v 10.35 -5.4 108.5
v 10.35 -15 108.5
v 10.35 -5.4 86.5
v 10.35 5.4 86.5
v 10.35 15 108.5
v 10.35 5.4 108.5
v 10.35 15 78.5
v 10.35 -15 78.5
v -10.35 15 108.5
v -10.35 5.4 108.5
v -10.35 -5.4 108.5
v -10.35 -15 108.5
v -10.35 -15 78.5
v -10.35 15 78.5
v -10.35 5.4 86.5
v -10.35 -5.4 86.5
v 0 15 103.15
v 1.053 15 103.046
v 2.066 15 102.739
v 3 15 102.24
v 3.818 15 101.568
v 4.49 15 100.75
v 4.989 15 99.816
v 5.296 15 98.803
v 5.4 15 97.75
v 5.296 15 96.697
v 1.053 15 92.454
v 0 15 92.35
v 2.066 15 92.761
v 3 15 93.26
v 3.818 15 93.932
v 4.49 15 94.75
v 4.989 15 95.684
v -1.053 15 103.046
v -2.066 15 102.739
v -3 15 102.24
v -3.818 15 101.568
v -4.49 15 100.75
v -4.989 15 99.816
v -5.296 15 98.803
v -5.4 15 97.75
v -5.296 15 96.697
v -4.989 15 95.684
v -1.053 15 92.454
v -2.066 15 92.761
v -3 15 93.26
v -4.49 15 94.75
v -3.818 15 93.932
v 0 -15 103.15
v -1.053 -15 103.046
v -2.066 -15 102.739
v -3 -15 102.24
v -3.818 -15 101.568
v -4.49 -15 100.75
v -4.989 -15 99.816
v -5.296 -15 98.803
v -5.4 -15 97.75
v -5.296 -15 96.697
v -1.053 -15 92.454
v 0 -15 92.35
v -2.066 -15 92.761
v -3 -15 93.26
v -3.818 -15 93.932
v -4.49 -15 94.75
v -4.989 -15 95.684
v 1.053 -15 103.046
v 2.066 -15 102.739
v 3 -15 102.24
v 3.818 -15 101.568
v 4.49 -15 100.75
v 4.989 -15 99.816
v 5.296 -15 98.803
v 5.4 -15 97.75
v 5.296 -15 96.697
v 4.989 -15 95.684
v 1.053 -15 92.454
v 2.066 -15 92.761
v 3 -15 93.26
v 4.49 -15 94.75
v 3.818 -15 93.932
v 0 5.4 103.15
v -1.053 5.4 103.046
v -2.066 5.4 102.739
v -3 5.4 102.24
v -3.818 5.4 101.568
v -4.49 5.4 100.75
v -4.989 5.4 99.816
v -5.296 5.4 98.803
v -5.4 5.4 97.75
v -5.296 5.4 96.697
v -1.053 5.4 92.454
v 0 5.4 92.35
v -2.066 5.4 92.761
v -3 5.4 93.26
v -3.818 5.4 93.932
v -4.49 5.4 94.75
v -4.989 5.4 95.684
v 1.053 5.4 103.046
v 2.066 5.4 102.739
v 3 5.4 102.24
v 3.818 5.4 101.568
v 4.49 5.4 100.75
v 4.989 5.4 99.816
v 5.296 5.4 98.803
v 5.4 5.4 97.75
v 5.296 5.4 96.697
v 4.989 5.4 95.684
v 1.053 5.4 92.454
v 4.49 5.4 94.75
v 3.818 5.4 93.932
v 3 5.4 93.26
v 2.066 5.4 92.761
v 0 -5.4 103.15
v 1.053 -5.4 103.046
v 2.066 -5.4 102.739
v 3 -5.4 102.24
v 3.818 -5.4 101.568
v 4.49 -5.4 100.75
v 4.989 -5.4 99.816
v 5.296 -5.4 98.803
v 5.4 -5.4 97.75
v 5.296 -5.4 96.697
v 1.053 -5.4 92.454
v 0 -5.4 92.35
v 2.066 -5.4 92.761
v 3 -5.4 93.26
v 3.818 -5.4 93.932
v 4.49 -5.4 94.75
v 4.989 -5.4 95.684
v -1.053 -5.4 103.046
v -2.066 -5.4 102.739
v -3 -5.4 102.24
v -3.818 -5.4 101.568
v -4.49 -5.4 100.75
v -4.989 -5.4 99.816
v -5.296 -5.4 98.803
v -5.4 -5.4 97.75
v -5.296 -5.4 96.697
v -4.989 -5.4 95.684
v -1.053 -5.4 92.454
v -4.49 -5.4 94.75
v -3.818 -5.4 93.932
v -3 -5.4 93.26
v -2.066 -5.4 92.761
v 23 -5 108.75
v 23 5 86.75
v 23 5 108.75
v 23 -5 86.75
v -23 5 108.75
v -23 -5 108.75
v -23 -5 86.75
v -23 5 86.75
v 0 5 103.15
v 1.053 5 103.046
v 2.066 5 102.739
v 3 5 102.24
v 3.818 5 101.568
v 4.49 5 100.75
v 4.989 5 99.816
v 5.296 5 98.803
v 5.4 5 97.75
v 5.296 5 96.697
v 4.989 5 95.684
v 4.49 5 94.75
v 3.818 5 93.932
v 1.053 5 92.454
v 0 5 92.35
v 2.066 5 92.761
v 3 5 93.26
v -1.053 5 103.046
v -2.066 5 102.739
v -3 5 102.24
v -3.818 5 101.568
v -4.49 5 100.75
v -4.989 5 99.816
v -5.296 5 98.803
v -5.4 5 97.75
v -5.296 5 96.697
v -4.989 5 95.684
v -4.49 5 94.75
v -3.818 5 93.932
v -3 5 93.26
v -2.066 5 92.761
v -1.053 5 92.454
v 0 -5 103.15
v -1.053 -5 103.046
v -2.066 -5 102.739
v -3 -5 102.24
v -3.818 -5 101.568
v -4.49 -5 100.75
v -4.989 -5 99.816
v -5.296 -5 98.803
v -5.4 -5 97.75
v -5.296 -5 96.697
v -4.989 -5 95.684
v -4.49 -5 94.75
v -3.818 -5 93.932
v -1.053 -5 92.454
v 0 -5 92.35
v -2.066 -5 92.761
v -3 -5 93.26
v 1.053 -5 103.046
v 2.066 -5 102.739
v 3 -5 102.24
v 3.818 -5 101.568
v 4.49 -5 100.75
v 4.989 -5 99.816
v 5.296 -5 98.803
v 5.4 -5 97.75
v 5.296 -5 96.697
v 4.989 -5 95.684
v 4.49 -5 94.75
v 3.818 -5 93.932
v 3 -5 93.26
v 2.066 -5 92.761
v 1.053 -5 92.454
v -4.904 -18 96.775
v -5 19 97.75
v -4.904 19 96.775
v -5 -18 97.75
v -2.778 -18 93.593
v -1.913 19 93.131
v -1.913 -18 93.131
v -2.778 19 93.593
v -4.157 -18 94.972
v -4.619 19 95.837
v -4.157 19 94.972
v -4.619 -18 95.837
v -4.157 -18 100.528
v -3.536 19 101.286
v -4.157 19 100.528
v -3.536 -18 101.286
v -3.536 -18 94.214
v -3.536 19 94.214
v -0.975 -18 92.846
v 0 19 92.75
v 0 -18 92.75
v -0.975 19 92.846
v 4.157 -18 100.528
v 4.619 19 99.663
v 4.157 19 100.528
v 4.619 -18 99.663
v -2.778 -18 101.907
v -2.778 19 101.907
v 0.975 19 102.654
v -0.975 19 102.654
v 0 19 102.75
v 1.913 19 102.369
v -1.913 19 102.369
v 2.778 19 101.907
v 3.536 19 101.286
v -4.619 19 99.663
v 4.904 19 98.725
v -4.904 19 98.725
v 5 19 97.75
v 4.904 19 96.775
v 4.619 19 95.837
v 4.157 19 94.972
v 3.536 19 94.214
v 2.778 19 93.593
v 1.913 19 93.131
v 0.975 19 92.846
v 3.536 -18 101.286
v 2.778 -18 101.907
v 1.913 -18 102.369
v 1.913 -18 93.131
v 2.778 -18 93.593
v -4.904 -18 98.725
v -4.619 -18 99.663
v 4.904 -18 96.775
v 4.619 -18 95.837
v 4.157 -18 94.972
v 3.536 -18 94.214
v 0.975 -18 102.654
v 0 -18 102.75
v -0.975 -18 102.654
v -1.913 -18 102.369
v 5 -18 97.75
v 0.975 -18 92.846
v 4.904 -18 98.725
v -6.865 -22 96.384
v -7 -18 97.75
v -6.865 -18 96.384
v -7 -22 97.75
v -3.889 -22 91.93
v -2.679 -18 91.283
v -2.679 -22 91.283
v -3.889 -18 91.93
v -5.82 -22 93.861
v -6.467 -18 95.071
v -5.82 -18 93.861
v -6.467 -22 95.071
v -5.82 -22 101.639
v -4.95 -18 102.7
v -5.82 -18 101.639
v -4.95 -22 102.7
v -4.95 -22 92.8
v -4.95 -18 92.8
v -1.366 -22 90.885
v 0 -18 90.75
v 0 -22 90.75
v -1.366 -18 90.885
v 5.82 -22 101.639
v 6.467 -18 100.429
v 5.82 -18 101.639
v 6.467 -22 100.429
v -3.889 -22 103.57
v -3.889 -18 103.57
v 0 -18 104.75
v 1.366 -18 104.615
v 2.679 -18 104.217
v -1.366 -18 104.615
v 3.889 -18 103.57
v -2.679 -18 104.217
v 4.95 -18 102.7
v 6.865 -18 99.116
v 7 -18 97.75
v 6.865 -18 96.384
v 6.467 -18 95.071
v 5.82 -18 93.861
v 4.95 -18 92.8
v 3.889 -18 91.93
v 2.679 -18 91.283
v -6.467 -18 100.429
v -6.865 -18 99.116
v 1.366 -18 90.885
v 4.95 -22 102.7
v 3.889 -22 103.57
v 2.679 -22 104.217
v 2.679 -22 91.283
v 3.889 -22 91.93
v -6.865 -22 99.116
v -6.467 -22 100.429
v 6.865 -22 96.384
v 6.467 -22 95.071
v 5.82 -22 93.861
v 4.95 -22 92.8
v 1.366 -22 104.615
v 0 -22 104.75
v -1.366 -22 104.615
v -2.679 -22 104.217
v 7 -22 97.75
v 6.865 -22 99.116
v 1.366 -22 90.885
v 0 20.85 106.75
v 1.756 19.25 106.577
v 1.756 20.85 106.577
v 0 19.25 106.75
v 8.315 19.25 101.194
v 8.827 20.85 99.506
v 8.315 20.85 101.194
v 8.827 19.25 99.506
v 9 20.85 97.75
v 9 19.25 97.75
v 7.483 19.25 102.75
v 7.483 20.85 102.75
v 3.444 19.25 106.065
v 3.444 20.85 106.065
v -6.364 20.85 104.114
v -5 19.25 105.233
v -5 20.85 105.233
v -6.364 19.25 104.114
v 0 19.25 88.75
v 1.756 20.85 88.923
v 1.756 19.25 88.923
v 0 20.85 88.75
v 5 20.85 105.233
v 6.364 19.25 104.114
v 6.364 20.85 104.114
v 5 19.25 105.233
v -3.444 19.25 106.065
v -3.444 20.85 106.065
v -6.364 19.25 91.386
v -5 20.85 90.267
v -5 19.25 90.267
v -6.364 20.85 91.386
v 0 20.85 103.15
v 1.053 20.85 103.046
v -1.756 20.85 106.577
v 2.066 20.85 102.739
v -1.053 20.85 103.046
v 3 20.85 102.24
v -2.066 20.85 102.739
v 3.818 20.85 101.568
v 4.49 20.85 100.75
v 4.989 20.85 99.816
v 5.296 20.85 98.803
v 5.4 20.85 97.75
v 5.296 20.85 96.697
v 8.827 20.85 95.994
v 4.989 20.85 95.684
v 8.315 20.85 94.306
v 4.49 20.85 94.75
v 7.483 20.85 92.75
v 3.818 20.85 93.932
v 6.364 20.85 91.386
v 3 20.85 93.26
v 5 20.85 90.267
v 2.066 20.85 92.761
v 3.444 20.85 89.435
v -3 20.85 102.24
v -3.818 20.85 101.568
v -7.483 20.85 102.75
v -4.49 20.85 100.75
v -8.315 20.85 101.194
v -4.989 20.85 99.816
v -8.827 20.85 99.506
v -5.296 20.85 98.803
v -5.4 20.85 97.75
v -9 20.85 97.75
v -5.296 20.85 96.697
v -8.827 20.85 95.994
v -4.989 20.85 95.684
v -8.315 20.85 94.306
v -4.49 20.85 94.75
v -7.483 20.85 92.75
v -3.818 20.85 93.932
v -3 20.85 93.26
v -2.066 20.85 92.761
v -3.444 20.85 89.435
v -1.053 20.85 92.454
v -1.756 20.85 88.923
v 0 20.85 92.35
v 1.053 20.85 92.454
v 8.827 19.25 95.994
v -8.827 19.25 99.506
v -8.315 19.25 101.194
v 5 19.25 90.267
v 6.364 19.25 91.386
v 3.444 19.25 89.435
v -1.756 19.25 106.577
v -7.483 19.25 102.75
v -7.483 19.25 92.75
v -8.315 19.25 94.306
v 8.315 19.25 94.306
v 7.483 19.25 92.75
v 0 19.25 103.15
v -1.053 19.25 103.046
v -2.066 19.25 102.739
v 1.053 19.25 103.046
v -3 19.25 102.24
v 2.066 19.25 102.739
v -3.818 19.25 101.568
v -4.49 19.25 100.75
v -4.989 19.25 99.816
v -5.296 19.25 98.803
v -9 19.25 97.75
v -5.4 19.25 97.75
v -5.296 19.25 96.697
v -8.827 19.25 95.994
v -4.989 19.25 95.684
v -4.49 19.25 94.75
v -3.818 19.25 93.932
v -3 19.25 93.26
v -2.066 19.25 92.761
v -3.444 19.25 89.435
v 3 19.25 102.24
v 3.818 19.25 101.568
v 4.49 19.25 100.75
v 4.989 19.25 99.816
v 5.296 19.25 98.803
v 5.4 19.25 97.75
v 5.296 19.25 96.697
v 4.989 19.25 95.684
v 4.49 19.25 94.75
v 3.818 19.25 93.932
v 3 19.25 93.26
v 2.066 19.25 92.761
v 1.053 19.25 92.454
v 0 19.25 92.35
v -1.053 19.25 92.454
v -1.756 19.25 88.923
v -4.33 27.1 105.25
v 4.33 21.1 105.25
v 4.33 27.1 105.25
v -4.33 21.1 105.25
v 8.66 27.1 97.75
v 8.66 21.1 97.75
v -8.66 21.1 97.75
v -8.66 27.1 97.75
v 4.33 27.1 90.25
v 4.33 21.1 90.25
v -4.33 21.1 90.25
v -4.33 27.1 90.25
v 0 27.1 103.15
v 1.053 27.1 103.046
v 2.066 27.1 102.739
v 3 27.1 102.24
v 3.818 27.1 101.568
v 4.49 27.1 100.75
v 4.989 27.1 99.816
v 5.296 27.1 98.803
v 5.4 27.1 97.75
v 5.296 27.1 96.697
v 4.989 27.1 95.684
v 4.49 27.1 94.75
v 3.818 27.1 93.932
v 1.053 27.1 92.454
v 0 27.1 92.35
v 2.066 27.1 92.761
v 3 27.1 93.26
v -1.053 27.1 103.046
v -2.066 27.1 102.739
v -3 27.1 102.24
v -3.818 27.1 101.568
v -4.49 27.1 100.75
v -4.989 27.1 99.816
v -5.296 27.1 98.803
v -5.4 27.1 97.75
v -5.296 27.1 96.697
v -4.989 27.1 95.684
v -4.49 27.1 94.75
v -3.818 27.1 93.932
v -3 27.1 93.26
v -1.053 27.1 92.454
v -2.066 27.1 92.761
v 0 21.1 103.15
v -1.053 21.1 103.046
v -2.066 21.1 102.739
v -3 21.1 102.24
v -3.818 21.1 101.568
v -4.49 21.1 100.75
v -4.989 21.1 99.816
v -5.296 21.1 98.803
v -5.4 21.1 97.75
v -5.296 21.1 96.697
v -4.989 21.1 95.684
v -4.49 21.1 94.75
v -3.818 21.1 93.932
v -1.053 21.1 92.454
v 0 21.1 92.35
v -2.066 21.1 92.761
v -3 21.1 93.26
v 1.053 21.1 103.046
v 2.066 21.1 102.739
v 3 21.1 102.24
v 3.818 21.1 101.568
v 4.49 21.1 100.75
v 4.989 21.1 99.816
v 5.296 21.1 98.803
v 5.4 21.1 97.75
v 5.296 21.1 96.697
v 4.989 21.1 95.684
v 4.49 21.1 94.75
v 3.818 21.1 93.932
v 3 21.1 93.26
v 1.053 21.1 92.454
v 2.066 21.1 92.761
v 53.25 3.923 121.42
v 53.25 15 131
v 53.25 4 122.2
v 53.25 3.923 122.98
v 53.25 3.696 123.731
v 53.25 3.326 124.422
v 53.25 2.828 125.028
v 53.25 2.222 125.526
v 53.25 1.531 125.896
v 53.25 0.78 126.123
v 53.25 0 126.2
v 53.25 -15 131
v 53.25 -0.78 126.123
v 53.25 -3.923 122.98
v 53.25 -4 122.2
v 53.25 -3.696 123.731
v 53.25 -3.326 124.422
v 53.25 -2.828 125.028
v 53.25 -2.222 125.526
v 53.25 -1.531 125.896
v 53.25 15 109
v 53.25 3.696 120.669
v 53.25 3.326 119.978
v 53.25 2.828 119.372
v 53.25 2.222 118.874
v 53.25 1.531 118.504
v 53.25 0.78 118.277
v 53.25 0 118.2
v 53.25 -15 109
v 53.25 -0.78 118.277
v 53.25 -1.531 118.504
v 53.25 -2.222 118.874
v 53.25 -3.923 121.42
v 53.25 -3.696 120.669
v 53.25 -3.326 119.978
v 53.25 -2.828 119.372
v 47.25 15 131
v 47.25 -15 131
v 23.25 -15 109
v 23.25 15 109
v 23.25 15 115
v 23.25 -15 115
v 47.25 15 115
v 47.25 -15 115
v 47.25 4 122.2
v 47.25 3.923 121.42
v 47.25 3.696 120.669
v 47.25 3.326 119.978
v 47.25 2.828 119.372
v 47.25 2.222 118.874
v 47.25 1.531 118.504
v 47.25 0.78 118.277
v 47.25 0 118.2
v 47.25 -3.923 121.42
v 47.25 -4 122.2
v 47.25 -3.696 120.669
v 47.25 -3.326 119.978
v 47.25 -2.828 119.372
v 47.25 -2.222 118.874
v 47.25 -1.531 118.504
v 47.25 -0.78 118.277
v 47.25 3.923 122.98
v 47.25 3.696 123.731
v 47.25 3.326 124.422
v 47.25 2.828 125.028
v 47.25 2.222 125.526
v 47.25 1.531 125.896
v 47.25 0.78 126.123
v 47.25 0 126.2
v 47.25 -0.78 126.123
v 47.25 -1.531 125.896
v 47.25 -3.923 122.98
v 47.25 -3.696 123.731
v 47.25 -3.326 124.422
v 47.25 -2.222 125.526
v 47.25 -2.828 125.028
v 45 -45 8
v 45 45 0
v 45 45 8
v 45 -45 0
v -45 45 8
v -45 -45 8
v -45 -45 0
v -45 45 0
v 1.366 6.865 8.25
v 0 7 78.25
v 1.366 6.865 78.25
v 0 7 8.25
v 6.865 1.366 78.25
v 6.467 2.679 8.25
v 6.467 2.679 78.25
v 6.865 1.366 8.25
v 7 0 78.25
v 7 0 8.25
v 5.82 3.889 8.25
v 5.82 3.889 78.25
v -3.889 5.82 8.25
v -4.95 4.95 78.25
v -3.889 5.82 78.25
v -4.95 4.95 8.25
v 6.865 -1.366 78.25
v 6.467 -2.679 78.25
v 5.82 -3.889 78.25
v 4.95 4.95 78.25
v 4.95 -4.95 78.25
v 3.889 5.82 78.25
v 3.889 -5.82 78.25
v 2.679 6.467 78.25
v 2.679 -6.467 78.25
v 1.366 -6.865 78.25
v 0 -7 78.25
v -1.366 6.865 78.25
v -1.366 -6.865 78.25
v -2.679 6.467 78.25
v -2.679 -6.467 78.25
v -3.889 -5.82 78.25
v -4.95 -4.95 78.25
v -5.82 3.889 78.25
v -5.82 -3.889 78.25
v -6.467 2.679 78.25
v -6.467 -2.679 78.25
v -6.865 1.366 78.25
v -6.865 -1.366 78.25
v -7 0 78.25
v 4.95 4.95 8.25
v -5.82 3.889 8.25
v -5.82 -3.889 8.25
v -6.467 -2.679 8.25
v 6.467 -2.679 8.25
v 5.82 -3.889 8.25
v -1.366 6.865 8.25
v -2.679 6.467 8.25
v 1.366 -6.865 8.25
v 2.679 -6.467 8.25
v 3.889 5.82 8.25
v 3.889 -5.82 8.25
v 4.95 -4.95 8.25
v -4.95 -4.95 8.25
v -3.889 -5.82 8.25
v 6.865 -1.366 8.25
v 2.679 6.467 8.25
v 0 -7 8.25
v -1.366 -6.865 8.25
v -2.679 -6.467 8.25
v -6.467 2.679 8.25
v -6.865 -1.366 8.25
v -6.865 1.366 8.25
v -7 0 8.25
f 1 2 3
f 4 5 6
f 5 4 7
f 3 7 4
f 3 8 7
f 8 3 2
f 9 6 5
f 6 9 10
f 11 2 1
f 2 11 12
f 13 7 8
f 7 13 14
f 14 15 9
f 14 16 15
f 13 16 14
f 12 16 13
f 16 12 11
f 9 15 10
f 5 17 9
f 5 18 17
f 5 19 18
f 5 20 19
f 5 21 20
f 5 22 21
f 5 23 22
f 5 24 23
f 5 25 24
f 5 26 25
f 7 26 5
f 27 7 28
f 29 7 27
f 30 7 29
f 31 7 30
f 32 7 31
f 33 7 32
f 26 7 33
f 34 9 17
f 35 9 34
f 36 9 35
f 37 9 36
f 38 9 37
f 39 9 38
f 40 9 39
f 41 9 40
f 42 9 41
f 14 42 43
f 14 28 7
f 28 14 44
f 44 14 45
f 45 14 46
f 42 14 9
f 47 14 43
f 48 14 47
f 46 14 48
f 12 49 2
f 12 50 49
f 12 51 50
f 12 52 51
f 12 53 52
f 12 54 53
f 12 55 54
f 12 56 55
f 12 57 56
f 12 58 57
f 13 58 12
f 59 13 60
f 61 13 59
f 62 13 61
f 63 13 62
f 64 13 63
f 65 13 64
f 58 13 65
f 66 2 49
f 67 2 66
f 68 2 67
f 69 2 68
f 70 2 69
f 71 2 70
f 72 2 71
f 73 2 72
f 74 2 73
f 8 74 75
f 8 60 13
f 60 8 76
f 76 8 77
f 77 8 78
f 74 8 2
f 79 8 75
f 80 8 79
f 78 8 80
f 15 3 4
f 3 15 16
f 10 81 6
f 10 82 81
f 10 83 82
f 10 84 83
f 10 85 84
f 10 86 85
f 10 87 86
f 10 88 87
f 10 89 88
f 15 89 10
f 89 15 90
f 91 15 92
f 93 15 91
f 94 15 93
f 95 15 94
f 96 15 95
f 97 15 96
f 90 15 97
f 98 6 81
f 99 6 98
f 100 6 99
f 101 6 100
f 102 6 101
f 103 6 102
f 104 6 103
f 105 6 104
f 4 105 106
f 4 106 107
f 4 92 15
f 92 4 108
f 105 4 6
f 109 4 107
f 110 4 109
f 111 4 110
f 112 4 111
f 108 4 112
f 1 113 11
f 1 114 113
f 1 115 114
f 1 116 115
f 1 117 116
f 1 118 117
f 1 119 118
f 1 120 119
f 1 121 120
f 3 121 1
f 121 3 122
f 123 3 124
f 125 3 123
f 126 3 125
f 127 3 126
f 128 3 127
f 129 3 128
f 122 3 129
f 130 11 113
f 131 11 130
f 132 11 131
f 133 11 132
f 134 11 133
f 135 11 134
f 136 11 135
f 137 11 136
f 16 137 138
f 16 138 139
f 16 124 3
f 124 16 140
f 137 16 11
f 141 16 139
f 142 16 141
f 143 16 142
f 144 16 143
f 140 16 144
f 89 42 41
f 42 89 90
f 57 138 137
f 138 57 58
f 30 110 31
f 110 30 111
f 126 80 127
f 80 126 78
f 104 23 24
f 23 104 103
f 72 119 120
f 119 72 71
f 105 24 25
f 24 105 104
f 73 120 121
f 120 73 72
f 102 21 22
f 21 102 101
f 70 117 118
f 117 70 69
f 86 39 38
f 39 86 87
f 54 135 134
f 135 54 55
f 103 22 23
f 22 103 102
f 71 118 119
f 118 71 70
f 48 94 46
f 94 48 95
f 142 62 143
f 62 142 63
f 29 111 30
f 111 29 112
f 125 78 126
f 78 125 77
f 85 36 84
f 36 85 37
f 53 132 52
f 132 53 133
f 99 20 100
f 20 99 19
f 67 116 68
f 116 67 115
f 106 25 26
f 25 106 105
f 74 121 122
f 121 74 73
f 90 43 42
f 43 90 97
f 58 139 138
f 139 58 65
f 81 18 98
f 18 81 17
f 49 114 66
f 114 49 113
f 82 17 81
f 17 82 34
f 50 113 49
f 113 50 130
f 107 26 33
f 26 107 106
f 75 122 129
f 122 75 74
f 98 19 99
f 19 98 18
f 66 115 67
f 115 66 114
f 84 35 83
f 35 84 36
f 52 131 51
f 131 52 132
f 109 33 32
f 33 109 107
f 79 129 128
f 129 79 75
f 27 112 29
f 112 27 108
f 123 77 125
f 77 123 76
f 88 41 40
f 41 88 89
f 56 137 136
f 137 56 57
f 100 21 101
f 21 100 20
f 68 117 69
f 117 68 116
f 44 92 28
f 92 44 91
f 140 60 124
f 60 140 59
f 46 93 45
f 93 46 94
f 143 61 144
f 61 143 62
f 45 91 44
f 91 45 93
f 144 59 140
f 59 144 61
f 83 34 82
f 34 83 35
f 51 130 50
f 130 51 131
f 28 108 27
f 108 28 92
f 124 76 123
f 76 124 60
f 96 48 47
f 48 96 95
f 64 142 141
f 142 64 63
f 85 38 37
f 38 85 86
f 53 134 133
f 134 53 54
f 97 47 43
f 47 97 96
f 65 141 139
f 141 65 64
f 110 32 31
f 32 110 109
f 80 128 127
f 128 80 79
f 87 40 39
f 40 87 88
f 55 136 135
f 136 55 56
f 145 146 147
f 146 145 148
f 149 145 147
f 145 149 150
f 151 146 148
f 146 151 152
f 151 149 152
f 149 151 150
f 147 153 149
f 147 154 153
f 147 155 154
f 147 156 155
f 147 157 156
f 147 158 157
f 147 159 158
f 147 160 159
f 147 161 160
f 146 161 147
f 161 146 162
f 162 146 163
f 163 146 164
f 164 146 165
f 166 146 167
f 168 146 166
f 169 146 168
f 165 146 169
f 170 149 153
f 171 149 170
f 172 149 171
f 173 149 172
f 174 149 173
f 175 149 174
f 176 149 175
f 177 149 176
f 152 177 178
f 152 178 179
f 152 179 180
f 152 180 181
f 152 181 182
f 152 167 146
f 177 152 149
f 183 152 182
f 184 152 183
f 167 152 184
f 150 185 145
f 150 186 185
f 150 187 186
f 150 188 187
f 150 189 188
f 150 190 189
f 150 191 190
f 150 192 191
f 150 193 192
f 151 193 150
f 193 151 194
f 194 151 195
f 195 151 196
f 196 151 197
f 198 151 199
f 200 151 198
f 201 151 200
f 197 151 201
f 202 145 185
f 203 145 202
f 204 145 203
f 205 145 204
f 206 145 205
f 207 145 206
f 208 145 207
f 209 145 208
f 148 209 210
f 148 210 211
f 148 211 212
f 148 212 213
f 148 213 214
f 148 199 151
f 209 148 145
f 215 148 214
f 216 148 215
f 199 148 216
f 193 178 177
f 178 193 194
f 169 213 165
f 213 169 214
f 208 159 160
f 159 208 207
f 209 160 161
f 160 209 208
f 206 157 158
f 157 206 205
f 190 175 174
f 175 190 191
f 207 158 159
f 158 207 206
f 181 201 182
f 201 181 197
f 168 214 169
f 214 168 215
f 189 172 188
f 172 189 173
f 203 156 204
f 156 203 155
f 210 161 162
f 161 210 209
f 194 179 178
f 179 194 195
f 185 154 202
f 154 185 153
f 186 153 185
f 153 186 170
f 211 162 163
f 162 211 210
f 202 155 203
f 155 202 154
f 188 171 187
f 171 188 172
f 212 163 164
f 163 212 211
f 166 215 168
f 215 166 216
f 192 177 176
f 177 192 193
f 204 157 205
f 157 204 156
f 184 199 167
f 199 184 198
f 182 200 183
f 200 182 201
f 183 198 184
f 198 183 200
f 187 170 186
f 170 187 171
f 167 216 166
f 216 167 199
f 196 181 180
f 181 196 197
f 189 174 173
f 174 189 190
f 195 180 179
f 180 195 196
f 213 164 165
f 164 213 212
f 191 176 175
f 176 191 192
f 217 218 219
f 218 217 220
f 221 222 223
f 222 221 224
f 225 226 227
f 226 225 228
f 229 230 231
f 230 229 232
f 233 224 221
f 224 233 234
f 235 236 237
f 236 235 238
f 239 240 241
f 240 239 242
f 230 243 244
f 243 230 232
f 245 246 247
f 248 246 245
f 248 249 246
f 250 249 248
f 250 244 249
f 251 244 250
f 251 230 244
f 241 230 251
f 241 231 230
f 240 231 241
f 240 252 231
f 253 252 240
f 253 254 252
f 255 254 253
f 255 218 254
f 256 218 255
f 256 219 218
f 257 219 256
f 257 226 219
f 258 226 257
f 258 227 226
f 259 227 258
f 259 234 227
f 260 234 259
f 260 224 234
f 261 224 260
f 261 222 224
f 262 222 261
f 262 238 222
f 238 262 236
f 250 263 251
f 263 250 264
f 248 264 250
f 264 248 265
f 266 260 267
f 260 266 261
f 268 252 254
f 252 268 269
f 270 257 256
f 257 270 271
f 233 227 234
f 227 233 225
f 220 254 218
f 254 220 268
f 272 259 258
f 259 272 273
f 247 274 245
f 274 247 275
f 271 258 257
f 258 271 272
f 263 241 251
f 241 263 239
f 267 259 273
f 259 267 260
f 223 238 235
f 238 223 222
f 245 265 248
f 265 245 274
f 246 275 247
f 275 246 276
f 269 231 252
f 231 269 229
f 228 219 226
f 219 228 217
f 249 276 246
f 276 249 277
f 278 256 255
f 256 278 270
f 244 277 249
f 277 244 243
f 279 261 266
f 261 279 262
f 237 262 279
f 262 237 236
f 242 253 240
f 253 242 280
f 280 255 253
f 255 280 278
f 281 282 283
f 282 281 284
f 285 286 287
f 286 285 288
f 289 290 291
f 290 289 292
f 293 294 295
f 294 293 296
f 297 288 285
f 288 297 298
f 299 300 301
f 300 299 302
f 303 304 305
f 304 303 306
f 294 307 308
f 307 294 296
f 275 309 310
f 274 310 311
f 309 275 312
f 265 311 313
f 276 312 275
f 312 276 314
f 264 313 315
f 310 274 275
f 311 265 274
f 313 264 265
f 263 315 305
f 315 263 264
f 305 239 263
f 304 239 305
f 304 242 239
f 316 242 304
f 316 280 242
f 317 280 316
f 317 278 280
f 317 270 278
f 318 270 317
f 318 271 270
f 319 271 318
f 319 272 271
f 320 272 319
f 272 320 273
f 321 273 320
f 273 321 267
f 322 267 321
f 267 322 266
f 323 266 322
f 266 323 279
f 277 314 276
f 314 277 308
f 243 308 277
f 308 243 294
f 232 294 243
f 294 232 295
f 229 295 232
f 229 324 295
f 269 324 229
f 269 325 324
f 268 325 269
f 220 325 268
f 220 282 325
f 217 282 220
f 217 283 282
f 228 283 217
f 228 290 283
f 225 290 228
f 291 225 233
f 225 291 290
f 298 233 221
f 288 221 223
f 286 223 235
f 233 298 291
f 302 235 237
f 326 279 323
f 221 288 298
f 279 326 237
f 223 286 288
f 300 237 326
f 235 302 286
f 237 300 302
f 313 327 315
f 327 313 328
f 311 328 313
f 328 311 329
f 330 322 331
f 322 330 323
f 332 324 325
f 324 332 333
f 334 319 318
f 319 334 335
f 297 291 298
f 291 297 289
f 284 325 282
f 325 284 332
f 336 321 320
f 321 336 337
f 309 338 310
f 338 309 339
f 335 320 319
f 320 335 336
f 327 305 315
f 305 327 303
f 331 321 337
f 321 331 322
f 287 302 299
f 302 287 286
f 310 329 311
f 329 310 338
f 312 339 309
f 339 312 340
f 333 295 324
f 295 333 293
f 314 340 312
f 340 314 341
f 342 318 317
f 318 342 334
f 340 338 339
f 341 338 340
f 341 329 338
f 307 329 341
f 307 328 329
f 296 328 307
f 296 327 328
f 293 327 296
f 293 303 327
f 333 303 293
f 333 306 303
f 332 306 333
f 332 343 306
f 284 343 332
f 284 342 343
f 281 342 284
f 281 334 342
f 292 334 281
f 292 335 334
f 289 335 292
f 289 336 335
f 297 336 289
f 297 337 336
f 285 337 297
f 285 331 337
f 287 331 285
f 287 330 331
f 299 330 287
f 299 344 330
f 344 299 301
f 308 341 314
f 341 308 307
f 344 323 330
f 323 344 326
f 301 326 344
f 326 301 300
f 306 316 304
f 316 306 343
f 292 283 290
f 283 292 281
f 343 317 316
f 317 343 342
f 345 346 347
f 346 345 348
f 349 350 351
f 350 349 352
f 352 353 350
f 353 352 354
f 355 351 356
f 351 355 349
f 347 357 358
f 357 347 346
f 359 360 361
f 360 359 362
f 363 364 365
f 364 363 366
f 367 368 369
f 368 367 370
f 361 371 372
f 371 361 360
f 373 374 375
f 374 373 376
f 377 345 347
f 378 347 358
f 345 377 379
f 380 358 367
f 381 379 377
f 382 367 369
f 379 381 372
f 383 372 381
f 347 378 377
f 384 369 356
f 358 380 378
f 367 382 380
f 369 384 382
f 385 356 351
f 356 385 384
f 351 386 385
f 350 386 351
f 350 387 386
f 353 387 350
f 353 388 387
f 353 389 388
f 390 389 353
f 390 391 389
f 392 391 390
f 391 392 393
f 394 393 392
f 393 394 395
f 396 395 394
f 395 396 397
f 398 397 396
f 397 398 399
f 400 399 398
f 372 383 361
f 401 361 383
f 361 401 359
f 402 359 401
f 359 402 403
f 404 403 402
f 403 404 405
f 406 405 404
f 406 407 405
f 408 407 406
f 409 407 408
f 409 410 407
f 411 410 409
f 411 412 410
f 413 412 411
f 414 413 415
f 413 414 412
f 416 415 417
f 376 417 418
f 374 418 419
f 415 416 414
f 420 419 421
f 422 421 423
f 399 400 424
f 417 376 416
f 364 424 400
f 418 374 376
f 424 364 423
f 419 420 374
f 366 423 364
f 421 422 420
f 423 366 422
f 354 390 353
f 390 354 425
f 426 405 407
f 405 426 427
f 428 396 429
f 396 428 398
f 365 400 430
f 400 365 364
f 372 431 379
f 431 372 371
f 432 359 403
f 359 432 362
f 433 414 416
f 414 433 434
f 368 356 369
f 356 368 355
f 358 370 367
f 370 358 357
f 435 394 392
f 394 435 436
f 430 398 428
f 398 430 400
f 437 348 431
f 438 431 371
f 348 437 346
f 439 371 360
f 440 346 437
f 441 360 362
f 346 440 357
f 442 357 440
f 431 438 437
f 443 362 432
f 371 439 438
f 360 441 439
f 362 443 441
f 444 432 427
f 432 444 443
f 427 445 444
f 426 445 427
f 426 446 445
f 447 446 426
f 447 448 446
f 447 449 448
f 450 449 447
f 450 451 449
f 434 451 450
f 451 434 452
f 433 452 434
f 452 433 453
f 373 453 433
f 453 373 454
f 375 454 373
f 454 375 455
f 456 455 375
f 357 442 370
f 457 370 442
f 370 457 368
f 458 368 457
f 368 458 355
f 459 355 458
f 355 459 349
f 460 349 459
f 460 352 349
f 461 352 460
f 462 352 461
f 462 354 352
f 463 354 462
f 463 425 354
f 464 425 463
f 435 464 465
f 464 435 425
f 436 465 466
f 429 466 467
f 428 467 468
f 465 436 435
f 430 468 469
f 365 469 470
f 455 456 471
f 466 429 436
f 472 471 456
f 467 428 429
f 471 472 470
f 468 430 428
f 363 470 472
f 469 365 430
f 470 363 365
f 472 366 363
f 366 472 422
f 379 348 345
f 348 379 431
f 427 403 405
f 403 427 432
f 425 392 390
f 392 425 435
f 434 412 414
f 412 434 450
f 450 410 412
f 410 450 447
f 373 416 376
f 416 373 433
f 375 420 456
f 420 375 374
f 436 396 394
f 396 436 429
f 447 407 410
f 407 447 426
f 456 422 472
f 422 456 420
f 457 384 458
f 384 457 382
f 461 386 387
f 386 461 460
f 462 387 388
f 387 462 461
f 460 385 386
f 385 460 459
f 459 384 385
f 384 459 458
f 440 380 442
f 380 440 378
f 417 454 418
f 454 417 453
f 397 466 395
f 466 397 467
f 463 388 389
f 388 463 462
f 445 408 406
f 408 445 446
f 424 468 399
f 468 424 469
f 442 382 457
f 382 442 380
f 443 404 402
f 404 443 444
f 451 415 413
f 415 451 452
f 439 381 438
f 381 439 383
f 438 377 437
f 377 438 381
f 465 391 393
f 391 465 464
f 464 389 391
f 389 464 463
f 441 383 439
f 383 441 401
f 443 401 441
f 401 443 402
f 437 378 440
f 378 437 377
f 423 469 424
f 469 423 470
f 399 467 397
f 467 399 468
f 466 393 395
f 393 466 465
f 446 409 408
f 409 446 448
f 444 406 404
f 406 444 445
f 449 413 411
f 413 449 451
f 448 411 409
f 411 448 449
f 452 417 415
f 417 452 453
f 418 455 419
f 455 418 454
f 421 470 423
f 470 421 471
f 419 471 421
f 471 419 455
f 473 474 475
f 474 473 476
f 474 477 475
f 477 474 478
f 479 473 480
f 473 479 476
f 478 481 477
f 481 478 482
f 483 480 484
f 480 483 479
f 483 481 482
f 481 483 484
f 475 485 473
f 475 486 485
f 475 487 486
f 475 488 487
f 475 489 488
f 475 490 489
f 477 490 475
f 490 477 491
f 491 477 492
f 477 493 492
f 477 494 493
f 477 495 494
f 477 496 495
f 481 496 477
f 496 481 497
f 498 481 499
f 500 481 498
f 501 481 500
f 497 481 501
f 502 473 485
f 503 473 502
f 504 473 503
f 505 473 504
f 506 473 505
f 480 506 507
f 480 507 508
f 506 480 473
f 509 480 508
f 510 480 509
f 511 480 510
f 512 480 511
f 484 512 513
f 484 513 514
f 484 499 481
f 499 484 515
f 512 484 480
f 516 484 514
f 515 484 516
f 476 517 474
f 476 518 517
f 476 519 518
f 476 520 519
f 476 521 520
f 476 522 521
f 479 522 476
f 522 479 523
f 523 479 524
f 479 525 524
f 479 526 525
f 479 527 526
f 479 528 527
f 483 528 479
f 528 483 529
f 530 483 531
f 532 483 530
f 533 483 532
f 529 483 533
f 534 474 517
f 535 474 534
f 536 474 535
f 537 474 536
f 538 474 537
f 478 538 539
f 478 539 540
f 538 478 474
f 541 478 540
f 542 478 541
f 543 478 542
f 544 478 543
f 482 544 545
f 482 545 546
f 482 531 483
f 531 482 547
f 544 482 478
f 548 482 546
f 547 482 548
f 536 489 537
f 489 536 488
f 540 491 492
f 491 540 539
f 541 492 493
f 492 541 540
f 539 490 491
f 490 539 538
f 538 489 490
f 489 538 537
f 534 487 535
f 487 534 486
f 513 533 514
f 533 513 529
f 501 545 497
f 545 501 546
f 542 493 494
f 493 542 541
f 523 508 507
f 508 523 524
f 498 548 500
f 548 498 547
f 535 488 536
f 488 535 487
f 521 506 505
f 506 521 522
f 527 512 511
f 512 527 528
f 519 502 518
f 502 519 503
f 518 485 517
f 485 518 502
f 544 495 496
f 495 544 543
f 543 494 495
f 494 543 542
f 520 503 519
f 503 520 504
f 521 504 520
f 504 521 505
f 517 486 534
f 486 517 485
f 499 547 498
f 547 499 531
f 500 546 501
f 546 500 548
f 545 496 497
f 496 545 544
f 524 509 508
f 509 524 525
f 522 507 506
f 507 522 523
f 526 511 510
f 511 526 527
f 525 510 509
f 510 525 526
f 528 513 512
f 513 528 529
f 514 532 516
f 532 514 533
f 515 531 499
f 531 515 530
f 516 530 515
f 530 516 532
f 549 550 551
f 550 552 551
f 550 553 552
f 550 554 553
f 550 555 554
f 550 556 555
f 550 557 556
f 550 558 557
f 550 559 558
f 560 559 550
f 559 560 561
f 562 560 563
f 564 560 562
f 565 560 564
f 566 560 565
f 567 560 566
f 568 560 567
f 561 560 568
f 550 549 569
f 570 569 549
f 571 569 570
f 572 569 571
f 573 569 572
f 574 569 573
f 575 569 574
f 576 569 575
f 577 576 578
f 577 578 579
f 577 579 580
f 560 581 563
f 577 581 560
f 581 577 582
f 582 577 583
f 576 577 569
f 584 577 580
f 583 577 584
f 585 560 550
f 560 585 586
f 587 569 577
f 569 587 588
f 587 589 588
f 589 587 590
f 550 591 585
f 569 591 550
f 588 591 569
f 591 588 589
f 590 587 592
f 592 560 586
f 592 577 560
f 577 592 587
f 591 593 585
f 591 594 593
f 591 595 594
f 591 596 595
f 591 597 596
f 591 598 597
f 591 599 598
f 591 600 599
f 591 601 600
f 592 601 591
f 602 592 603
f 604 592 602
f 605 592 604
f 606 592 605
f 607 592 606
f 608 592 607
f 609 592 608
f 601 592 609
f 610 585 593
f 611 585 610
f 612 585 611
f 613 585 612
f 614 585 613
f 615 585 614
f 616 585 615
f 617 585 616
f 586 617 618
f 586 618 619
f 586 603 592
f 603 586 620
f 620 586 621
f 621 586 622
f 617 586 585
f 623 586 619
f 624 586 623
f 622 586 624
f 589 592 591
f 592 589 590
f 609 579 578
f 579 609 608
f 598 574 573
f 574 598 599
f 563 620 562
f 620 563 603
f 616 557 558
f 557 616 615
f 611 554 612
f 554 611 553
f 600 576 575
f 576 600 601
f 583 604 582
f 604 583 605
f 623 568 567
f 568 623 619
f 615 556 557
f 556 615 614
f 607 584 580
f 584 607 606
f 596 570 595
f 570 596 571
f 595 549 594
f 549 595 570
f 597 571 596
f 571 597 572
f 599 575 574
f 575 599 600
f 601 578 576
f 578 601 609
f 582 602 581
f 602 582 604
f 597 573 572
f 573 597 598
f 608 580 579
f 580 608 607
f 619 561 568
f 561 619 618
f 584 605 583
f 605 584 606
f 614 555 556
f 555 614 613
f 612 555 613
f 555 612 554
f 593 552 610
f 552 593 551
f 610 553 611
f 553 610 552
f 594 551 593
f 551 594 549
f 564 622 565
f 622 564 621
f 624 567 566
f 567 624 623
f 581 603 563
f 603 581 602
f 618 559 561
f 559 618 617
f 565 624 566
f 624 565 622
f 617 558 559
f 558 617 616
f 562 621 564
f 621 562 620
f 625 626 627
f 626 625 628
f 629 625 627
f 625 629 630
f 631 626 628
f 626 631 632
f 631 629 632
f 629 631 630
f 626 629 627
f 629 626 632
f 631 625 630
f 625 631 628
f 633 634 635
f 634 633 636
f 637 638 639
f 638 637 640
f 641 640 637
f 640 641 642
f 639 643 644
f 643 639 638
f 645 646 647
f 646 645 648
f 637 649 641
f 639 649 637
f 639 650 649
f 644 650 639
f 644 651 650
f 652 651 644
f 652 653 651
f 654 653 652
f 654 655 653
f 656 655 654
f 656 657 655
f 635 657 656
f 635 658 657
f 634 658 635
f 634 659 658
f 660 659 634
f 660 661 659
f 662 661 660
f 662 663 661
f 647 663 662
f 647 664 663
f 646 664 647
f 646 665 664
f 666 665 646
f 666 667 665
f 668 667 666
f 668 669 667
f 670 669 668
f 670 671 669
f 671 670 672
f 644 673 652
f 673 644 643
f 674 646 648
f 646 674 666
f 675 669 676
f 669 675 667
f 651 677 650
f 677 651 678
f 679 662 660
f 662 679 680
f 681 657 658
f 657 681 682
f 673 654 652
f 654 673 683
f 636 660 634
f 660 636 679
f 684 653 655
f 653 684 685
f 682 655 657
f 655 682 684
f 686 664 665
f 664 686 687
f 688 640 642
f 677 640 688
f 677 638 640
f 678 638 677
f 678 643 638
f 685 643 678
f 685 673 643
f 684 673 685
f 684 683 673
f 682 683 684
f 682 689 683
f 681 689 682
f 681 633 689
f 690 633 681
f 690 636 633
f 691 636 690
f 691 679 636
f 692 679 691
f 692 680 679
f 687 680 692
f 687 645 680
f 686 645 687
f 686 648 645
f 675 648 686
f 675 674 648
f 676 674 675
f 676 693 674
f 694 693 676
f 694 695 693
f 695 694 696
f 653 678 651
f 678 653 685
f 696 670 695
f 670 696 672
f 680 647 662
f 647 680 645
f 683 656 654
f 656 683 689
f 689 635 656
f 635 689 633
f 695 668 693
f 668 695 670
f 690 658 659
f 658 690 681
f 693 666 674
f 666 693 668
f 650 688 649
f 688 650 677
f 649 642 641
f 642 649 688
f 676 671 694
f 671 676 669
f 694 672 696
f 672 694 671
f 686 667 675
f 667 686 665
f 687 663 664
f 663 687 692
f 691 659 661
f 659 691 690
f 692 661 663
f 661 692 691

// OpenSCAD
$fn = 32;

// ------------------------------------------------------------------------
// Lamp arm: column d14 x 70 mm, arm 46 mm
// Every part is its own module, assembly() places every instance.
// ------------------------------------------------------------------------

// --- part 1 ---
module lamp_base() {
  difference() {
    translate([-45, -45, 0]) cube([90, 90, 8]);
  }
}

// --- part 2 ---
module lamp_column() {
  cylinder(h = 70, d = 14);
}

// --- part 3 ---
module head_fork() {
  difference() {
    translate([-10.35, -15, 0]) cube([20.7, 30, 30]);
    translate([-11.35, -5.4, 8]) cube([22.7, 10.8, 23]);
    translate([0, 0, 19.25]) rotate([90, 0, 0]) cylinder(h = 32, d = 10.8, center = true);
  }
}

// --- part 4 ---
module lamp_arm() {
  difference() {
    translate([-23, -5, 0]) cube([46, 10, 22]);
    translate([0, 0, 11]) rotate([90, 0, 0]) cylinder(h = 12, d = 10.8, center = true);
  }
}

// --- part 5 ---
module arm_pin() {
  rotate([0, 90, 0]) cylinder(h = 38, d = 10, center = true);
  translate([-22, 0, 0]) rotate([0, 90, 0]) cylinder(h = 4, d = 14);
}

// --- part 6 ---
module arm_washer() {
  difference() {
      translate([0, 0, 0]) cylinder(h = 1.6, d = 18);
      translate([0, 0, -1]) cylinder(h = 3.6, d = 10.8);
    }
}

// --- part 7 ---
module arm_nut() {
  difference() {
    linear_extrude(height = 6) polygon(points = [[8.66, 0], [4.33, 7.5], [-4.33, 7.5], [-8.66, 0], [-4.33, -7.5], [4.33, -7.5]]);
    translate([0, 0, -1]) cylinder(h = 8, d = 10.8);
  }
}

// --- part 8 ---
module shade_bracket() {
  difference() {
    translate([-15, -15, 0]) cube([30, 30, 22]);
    translate([-16, -16, 6]) cube([25, 32, 17]);
    translate([12, 0, 13.2]) rotate([0, 90, 0]) cylinder(h = 8, d = 8, center = true);
  }
}

// --- assembly ---
module assembly() {
  color([0.80, 0.24, 0.20]) translate([0, 0, 0]) rotate([0, 0, 0]) lamp_base();
  color([0.20, 0.45, 0.75]) translate([0, 0, 8.25]) rotate([0, 0, 0]) lamp_column();
  color([0.25, 0.62, 0.32]) translate([0, 0, 78.5]) rotate([0, 0, 0]) head_fork();
  color([0.92, 0.70, 0.18]) translate([0, 0, 86.75]) rotate([0, 0, 0]) lamp_arm();
  color([0.58, 0.35, 0.70]) translate([0, 0, 97.75]) rotate([0, 0, 90]) arm_pin();
  color([0.16, 0.66, 0.66]) translate([0, 20.85, 97.75]) rotate([90, 0, 0]) arm_washer();
  color([0.85, 0.48, 0.18]) translate([0, 27.1, 97.75]) rotate([90, 0, 0]) arm_nut();
  color([0.55, 0.60, 0.65]) translate([38.25, 0, 109]) rotate([0, 0, 0]) shade_bracket();
}

assembly();
